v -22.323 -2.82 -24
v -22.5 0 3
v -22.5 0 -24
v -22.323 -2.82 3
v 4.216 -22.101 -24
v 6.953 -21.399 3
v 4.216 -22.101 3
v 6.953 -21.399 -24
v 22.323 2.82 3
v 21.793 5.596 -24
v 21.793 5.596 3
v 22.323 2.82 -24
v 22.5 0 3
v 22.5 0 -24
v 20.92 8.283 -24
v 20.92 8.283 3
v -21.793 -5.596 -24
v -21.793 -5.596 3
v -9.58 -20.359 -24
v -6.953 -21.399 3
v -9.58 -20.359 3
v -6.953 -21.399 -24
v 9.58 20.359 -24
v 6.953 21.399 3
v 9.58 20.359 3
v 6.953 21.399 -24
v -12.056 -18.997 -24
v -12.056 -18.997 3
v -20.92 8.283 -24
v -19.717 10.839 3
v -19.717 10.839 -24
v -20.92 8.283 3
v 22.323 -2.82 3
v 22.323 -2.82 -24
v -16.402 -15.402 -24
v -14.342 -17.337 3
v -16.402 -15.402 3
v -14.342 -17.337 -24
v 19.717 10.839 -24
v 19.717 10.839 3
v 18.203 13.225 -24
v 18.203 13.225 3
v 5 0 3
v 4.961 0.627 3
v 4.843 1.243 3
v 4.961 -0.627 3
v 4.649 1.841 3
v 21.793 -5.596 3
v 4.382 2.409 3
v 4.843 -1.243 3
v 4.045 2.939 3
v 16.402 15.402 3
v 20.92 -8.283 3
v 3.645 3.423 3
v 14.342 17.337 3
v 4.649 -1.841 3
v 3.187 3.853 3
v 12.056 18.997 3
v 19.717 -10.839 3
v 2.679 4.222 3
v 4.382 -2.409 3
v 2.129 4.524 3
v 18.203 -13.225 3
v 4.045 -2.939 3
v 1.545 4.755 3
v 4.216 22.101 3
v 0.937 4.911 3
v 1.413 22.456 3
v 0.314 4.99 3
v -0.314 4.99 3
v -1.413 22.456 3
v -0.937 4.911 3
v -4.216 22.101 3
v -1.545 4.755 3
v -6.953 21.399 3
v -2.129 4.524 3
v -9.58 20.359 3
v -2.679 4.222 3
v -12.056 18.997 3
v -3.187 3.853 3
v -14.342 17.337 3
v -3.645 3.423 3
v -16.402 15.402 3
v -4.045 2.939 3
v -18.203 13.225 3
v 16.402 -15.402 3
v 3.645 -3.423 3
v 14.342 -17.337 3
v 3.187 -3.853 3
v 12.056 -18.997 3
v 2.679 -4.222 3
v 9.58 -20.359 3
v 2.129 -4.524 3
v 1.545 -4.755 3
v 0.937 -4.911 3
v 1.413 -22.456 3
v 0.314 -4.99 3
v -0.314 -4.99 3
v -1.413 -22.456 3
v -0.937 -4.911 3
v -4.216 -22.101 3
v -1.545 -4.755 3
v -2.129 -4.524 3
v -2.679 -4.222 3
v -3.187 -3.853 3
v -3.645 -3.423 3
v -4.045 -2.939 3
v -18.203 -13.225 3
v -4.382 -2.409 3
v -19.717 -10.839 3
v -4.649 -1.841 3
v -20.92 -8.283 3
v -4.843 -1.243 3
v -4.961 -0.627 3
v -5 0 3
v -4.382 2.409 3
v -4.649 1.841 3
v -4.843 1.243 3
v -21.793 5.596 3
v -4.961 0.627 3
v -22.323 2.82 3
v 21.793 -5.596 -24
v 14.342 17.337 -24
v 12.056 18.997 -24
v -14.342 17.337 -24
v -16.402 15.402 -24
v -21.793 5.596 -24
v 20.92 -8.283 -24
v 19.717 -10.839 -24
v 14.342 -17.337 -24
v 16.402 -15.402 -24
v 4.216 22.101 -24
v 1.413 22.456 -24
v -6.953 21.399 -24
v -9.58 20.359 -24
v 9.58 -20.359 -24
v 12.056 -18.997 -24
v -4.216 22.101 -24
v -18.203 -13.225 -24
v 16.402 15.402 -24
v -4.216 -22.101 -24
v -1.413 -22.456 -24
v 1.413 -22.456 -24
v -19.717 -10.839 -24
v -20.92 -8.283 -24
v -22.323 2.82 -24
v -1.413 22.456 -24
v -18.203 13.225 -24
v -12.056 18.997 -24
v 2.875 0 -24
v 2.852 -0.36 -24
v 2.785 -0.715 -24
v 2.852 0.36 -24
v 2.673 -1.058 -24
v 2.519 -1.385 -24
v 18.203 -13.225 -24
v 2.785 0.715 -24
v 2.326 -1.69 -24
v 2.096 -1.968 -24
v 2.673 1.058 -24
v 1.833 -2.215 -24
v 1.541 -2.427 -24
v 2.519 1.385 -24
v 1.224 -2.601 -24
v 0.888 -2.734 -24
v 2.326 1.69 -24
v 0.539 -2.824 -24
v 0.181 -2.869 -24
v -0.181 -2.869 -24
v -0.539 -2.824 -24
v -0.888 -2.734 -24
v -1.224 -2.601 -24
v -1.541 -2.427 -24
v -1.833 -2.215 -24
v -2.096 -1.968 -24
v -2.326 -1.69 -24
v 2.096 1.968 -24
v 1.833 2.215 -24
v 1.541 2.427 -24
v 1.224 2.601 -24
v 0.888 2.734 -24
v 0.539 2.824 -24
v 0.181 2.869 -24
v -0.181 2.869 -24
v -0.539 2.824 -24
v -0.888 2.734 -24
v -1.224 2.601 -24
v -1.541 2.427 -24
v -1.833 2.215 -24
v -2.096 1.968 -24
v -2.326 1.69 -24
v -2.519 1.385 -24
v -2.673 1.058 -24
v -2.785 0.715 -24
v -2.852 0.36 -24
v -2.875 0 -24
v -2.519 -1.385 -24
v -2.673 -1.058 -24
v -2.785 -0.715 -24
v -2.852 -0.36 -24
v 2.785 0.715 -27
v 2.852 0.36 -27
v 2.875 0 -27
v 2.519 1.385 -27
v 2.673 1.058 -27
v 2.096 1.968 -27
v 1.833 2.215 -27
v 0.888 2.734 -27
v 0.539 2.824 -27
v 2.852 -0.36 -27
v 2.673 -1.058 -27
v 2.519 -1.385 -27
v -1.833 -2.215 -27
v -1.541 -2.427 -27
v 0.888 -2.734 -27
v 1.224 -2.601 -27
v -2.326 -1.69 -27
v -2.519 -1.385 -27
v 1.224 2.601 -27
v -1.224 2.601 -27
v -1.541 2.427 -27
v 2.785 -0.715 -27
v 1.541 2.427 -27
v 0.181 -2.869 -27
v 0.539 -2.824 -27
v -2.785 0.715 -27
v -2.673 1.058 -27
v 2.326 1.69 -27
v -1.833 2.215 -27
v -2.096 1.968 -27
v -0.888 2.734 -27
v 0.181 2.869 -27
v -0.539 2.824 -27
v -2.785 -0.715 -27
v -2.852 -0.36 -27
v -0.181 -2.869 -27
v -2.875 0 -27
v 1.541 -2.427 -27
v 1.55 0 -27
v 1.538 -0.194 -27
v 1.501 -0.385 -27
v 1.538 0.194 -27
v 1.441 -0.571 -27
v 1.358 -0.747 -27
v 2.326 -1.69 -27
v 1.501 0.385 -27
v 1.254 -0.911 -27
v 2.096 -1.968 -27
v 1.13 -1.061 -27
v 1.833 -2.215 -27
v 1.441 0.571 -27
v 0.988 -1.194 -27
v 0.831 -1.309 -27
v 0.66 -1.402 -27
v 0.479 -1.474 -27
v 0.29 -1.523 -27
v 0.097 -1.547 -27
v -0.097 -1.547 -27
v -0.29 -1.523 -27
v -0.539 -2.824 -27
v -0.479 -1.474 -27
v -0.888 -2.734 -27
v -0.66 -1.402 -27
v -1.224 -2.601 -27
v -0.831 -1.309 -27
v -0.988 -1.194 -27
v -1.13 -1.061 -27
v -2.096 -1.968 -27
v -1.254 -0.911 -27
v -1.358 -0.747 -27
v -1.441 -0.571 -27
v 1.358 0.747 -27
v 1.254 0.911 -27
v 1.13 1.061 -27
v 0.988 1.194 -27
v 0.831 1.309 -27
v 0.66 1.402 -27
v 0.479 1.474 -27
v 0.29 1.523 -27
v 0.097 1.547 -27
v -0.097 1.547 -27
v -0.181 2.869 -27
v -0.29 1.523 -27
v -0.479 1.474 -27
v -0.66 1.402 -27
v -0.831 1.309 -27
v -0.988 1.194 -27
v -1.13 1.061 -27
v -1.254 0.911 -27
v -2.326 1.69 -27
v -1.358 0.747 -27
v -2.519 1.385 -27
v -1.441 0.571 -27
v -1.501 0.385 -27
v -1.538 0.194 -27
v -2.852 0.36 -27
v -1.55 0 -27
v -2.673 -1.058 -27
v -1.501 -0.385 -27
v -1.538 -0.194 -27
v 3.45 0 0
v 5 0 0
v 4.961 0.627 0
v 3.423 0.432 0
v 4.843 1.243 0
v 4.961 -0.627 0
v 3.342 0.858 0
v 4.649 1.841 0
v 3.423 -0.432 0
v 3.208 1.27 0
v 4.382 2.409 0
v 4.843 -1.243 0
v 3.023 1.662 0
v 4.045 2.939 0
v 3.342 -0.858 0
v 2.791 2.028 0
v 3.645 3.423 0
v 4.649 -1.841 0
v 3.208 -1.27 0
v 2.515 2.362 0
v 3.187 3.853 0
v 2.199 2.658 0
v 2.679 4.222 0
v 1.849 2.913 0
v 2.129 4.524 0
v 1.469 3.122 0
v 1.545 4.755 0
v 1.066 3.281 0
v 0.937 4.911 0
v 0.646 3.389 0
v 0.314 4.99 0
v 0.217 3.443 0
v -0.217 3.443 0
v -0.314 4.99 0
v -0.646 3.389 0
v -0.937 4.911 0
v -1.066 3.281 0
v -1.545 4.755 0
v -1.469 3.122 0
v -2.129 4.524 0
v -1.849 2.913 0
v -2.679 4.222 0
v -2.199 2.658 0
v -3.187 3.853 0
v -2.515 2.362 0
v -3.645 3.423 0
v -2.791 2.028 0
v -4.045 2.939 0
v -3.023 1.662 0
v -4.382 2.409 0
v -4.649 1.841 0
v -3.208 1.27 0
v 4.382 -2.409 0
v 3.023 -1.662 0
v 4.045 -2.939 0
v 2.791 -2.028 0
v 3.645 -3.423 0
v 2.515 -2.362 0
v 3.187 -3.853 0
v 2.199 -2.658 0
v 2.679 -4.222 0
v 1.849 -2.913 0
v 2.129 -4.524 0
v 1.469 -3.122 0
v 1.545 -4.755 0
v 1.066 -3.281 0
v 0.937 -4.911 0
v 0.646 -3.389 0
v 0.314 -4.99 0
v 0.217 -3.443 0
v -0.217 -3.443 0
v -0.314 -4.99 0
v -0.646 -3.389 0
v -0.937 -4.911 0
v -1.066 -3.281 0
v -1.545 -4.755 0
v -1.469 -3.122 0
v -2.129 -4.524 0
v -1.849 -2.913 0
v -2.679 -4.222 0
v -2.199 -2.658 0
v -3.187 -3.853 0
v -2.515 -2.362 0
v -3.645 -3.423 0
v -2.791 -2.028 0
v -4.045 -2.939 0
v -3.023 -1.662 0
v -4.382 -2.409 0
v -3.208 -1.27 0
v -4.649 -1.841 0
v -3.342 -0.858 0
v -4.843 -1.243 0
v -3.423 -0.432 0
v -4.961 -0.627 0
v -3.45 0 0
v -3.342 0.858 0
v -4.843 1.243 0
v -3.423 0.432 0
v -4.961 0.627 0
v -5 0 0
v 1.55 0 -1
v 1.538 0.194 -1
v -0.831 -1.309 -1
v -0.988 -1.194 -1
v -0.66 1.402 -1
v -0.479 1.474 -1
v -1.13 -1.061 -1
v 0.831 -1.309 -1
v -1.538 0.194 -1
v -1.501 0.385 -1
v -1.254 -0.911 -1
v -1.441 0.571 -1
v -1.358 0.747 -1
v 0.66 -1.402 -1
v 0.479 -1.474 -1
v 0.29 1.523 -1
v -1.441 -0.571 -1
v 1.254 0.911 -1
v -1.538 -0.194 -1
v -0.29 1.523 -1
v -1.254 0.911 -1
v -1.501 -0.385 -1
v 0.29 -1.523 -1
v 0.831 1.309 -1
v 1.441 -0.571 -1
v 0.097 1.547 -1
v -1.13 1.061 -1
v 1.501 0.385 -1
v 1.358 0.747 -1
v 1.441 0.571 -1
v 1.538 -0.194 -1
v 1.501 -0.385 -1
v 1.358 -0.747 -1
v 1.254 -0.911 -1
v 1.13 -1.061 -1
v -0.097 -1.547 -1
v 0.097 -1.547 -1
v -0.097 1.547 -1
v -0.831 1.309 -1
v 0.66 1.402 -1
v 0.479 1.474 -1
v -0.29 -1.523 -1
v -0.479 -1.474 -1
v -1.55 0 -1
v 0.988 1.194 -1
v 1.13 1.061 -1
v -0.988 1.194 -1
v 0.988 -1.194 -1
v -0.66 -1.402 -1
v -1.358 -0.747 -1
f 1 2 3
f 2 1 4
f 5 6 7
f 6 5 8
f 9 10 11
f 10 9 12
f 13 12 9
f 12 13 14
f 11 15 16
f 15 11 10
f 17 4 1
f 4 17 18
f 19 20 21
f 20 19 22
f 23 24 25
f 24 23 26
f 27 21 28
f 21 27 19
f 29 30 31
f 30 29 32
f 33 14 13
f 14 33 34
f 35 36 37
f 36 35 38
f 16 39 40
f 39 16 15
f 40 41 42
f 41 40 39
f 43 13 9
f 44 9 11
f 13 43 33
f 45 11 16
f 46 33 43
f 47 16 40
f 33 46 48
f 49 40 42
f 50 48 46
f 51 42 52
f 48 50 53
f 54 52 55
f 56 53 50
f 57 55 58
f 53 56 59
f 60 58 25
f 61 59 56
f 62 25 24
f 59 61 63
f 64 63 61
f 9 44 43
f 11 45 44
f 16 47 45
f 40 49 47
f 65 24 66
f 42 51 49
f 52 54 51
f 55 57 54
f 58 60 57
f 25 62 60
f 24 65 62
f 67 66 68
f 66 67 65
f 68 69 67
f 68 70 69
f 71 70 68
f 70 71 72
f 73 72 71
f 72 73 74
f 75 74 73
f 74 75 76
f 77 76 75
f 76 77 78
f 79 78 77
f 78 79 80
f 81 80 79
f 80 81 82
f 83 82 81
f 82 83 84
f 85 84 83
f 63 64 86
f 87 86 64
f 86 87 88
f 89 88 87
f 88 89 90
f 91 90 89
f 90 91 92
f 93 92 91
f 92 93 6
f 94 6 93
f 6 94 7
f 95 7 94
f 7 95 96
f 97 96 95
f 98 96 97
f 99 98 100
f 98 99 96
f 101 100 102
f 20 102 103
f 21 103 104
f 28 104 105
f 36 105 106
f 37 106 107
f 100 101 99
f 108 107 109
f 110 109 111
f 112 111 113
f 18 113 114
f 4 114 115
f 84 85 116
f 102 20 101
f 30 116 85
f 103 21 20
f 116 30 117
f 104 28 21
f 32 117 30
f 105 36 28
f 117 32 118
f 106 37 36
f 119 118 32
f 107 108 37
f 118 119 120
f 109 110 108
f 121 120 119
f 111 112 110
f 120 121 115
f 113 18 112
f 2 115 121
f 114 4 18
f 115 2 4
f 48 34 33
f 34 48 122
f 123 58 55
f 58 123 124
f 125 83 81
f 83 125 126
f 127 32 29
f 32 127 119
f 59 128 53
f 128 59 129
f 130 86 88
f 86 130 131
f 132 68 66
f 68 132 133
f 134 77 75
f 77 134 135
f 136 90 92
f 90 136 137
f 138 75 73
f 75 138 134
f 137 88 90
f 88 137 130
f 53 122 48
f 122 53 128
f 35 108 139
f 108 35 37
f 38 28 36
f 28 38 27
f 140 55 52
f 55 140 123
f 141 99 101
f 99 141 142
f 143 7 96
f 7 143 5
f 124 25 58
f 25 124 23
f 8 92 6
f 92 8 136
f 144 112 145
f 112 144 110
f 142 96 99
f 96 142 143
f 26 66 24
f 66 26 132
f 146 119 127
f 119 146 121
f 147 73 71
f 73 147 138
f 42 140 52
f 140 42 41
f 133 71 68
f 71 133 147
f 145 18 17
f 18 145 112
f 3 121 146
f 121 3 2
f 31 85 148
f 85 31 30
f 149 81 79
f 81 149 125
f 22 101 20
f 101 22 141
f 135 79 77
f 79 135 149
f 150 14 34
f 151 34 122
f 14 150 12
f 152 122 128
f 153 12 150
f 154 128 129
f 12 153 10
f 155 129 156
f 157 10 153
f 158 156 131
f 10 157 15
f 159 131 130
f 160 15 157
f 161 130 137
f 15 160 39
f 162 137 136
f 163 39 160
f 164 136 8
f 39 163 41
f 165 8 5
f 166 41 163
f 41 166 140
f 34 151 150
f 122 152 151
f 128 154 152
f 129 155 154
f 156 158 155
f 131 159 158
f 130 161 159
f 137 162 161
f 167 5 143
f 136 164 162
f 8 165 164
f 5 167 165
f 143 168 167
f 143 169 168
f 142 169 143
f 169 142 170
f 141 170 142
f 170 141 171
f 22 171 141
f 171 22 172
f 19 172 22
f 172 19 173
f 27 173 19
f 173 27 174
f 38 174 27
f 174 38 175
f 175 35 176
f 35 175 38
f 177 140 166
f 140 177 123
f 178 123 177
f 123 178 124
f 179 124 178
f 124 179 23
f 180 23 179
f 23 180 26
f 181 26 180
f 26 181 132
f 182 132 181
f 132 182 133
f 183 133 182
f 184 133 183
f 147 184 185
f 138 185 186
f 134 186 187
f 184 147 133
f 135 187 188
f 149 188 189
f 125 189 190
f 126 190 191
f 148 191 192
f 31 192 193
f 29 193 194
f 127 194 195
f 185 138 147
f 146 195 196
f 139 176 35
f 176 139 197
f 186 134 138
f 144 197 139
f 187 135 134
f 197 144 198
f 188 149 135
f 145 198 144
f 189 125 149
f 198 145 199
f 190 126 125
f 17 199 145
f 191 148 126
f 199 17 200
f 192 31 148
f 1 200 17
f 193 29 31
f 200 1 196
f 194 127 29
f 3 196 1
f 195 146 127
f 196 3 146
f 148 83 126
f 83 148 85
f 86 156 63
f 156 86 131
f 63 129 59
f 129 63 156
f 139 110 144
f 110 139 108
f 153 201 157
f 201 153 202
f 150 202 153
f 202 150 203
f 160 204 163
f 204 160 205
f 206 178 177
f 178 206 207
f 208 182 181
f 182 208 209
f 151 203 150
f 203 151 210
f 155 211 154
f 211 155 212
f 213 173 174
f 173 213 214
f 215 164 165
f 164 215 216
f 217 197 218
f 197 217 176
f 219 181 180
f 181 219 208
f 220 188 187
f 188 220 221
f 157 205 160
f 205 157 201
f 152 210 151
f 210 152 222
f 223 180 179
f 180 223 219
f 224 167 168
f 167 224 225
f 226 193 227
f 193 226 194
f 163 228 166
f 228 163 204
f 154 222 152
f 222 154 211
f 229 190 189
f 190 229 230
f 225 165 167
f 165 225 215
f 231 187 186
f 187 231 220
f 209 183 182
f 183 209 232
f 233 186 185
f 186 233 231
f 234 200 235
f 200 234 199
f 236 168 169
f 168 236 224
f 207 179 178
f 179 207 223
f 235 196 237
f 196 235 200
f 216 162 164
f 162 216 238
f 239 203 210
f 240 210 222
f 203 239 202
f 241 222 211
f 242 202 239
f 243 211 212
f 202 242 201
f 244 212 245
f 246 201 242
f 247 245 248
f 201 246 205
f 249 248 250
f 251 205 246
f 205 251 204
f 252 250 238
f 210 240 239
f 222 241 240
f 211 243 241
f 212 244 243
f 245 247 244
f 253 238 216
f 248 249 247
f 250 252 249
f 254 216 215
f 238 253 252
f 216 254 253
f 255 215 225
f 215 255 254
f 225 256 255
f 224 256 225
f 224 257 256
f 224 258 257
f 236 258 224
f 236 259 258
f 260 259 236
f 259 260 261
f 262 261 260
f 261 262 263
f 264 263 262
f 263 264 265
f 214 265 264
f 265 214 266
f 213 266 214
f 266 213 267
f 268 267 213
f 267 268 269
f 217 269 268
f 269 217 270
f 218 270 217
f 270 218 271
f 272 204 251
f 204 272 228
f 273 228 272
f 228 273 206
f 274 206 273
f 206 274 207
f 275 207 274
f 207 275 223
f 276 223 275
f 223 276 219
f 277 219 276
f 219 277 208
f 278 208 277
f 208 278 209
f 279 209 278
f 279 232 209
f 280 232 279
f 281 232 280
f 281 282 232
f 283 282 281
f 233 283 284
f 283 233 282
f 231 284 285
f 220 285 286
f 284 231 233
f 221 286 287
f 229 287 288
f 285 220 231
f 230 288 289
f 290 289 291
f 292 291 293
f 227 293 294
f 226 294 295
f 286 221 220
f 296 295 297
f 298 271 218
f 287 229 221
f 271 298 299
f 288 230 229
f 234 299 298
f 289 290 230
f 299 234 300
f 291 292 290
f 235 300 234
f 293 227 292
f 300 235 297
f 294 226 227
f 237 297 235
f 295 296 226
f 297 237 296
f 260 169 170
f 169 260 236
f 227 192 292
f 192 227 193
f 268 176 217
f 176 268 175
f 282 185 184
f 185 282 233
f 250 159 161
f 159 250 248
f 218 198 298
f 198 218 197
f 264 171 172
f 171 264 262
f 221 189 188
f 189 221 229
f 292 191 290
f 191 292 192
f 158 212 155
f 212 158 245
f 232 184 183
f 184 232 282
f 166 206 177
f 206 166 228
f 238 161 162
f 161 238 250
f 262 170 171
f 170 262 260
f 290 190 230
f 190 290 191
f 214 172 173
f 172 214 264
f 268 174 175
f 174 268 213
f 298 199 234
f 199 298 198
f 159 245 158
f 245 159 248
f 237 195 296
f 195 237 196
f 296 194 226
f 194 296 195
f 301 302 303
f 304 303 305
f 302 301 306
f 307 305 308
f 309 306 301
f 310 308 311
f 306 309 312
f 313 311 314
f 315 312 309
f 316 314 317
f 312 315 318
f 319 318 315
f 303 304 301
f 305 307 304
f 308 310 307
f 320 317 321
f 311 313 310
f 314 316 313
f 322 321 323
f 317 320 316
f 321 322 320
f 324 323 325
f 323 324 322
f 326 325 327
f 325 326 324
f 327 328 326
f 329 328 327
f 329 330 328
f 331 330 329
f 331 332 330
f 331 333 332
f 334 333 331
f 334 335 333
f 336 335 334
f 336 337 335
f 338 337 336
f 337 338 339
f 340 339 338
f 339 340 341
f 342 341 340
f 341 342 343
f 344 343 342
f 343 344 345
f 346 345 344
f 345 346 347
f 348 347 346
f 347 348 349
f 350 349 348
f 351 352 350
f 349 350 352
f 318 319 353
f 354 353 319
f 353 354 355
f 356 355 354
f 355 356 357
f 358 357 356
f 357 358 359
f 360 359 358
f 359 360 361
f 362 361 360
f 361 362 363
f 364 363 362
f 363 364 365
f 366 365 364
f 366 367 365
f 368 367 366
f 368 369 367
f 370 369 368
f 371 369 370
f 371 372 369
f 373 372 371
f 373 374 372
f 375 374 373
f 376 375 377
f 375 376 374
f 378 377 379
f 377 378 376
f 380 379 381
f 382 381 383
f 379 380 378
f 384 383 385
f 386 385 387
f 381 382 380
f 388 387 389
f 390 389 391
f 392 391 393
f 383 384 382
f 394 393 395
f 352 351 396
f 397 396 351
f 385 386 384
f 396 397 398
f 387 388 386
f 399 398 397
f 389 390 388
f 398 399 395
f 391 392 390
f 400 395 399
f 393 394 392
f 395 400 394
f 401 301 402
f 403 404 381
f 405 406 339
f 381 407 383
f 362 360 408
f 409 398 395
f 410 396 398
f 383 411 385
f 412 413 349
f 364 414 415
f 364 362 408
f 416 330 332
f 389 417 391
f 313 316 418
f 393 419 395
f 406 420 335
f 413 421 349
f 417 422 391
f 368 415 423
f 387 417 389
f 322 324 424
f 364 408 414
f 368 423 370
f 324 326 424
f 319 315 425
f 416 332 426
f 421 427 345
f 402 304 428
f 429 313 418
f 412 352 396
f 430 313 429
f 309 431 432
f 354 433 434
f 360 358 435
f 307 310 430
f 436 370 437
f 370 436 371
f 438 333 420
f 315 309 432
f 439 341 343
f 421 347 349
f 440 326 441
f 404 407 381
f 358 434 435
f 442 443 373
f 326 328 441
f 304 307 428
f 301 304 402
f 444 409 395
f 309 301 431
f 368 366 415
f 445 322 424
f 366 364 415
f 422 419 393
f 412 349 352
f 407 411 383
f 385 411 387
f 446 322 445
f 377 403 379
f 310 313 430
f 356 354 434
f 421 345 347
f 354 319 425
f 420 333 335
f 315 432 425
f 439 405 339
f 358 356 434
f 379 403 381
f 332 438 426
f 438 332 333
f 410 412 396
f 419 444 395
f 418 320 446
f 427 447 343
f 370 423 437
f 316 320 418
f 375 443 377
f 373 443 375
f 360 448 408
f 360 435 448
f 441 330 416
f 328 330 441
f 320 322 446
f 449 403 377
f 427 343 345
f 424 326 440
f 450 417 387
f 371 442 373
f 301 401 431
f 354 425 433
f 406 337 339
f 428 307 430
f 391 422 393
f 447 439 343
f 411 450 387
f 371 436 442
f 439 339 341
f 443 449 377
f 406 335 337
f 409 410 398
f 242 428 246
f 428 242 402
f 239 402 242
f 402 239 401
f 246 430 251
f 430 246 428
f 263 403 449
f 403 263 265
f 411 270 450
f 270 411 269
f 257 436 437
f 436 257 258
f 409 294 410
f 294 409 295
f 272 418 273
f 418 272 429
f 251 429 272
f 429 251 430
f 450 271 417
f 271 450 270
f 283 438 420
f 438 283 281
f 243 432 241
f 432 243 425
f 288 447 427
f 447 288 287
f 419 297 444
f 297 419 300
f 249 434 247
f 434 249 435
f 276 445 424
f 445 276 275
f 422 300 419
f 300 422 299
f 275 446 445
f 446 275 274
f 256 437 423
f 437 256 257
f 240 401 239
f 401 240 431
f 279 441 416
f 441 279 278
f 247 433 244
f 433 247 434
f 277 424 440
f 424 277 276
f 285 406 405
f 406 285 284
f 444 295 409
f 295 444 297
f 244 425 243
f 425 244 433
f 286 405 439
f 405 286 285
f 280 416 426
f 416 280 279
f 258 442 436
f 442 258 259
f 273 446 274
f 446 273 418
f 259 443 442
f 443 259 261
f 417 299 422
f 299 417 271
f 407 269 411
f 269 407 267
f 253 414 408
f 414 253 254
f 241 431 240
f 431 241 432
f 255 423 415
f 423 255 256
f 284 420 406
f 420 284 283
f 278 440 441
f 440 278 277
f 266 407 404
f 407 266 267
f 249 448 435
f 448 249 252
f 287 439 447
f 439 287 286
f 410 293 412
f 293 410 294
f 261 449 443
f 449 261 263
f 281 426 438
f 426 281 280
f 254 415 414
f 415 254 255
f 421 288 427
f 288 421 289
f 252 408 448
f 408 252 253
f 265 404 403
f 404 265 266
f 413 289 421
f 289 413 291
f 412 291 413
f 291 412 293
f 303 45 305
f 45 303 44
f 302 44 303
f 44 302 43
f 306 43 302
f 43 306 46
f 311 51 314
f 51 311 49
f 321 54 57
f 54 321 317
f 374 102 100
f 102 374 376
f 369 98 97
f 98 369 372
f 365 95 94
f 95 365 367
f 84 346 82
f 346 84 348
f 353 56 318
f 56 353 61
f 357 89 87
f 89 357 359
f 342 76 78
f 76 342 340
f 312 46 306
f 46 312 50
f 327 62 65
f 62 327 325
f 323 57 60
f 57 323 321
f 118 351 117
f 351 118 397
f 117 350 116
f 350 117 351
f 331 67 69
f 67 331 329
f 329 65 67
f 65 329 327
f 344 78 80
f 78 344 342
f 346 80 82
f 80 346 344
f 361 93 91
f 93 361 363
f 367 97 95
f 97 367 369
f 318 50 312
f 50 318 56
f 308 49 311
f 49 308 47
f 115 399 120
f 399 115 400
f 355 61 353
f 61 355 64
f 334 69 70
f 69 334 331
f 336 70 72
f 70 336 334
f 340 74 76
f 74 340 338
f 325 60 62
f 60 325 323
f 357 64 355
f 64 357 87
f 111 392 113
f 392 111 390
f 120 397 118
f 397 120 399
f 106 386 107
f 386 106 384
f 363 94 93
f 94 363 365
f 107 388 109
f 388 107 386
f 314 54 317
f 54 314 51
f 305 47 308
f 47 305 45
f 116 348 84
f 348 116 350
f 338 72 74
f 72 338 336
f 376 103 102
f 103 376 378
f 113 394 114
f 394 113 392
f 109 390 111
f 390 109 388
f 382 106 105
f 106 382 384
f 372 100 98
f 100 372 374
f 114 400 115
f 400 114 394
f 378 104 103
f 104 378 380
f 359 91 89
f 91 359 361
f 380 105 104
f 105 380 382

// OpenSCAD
$fn = 50;


difference() {
	union() {
		translate(v = [0, 0, -24.0000000000]) {
			cylinder(h = 27, r = 22.5000000000);
		}
		#translate(v = [0, 0, -27.0000000000]) {
			cylinder(h = 27, r = 2.8750000000);
		}
	}
	union() {
		translate(v = [0, 0, 0]) {
			rotate(a = [0, 0, 0]) {
				difference() {
					union() {
						translate(v = [0, 0, -27.0000000000]) {
							cylinder(h = 27, r = 1.2500000000);
						}
						translate(v = [0, 0, -1.0000000000]) {
							cylinder(h = 1.0000000000, r1 = 1.5500000000, r2 = 3.4500000000);
						}
						translate(v = [0, 0, -27.0000000000]) {
							cylinder(h = 27, r = 1.5500000000);
						}
						translate(v = [0, 0, -27.0000000000]) {
							cylinder(h = 27, r = 1.2500000000);
						}
					}
					union();
				}
			}
		}
		#cylinder(h = 3, r = 5.0000000000);
	}
}
